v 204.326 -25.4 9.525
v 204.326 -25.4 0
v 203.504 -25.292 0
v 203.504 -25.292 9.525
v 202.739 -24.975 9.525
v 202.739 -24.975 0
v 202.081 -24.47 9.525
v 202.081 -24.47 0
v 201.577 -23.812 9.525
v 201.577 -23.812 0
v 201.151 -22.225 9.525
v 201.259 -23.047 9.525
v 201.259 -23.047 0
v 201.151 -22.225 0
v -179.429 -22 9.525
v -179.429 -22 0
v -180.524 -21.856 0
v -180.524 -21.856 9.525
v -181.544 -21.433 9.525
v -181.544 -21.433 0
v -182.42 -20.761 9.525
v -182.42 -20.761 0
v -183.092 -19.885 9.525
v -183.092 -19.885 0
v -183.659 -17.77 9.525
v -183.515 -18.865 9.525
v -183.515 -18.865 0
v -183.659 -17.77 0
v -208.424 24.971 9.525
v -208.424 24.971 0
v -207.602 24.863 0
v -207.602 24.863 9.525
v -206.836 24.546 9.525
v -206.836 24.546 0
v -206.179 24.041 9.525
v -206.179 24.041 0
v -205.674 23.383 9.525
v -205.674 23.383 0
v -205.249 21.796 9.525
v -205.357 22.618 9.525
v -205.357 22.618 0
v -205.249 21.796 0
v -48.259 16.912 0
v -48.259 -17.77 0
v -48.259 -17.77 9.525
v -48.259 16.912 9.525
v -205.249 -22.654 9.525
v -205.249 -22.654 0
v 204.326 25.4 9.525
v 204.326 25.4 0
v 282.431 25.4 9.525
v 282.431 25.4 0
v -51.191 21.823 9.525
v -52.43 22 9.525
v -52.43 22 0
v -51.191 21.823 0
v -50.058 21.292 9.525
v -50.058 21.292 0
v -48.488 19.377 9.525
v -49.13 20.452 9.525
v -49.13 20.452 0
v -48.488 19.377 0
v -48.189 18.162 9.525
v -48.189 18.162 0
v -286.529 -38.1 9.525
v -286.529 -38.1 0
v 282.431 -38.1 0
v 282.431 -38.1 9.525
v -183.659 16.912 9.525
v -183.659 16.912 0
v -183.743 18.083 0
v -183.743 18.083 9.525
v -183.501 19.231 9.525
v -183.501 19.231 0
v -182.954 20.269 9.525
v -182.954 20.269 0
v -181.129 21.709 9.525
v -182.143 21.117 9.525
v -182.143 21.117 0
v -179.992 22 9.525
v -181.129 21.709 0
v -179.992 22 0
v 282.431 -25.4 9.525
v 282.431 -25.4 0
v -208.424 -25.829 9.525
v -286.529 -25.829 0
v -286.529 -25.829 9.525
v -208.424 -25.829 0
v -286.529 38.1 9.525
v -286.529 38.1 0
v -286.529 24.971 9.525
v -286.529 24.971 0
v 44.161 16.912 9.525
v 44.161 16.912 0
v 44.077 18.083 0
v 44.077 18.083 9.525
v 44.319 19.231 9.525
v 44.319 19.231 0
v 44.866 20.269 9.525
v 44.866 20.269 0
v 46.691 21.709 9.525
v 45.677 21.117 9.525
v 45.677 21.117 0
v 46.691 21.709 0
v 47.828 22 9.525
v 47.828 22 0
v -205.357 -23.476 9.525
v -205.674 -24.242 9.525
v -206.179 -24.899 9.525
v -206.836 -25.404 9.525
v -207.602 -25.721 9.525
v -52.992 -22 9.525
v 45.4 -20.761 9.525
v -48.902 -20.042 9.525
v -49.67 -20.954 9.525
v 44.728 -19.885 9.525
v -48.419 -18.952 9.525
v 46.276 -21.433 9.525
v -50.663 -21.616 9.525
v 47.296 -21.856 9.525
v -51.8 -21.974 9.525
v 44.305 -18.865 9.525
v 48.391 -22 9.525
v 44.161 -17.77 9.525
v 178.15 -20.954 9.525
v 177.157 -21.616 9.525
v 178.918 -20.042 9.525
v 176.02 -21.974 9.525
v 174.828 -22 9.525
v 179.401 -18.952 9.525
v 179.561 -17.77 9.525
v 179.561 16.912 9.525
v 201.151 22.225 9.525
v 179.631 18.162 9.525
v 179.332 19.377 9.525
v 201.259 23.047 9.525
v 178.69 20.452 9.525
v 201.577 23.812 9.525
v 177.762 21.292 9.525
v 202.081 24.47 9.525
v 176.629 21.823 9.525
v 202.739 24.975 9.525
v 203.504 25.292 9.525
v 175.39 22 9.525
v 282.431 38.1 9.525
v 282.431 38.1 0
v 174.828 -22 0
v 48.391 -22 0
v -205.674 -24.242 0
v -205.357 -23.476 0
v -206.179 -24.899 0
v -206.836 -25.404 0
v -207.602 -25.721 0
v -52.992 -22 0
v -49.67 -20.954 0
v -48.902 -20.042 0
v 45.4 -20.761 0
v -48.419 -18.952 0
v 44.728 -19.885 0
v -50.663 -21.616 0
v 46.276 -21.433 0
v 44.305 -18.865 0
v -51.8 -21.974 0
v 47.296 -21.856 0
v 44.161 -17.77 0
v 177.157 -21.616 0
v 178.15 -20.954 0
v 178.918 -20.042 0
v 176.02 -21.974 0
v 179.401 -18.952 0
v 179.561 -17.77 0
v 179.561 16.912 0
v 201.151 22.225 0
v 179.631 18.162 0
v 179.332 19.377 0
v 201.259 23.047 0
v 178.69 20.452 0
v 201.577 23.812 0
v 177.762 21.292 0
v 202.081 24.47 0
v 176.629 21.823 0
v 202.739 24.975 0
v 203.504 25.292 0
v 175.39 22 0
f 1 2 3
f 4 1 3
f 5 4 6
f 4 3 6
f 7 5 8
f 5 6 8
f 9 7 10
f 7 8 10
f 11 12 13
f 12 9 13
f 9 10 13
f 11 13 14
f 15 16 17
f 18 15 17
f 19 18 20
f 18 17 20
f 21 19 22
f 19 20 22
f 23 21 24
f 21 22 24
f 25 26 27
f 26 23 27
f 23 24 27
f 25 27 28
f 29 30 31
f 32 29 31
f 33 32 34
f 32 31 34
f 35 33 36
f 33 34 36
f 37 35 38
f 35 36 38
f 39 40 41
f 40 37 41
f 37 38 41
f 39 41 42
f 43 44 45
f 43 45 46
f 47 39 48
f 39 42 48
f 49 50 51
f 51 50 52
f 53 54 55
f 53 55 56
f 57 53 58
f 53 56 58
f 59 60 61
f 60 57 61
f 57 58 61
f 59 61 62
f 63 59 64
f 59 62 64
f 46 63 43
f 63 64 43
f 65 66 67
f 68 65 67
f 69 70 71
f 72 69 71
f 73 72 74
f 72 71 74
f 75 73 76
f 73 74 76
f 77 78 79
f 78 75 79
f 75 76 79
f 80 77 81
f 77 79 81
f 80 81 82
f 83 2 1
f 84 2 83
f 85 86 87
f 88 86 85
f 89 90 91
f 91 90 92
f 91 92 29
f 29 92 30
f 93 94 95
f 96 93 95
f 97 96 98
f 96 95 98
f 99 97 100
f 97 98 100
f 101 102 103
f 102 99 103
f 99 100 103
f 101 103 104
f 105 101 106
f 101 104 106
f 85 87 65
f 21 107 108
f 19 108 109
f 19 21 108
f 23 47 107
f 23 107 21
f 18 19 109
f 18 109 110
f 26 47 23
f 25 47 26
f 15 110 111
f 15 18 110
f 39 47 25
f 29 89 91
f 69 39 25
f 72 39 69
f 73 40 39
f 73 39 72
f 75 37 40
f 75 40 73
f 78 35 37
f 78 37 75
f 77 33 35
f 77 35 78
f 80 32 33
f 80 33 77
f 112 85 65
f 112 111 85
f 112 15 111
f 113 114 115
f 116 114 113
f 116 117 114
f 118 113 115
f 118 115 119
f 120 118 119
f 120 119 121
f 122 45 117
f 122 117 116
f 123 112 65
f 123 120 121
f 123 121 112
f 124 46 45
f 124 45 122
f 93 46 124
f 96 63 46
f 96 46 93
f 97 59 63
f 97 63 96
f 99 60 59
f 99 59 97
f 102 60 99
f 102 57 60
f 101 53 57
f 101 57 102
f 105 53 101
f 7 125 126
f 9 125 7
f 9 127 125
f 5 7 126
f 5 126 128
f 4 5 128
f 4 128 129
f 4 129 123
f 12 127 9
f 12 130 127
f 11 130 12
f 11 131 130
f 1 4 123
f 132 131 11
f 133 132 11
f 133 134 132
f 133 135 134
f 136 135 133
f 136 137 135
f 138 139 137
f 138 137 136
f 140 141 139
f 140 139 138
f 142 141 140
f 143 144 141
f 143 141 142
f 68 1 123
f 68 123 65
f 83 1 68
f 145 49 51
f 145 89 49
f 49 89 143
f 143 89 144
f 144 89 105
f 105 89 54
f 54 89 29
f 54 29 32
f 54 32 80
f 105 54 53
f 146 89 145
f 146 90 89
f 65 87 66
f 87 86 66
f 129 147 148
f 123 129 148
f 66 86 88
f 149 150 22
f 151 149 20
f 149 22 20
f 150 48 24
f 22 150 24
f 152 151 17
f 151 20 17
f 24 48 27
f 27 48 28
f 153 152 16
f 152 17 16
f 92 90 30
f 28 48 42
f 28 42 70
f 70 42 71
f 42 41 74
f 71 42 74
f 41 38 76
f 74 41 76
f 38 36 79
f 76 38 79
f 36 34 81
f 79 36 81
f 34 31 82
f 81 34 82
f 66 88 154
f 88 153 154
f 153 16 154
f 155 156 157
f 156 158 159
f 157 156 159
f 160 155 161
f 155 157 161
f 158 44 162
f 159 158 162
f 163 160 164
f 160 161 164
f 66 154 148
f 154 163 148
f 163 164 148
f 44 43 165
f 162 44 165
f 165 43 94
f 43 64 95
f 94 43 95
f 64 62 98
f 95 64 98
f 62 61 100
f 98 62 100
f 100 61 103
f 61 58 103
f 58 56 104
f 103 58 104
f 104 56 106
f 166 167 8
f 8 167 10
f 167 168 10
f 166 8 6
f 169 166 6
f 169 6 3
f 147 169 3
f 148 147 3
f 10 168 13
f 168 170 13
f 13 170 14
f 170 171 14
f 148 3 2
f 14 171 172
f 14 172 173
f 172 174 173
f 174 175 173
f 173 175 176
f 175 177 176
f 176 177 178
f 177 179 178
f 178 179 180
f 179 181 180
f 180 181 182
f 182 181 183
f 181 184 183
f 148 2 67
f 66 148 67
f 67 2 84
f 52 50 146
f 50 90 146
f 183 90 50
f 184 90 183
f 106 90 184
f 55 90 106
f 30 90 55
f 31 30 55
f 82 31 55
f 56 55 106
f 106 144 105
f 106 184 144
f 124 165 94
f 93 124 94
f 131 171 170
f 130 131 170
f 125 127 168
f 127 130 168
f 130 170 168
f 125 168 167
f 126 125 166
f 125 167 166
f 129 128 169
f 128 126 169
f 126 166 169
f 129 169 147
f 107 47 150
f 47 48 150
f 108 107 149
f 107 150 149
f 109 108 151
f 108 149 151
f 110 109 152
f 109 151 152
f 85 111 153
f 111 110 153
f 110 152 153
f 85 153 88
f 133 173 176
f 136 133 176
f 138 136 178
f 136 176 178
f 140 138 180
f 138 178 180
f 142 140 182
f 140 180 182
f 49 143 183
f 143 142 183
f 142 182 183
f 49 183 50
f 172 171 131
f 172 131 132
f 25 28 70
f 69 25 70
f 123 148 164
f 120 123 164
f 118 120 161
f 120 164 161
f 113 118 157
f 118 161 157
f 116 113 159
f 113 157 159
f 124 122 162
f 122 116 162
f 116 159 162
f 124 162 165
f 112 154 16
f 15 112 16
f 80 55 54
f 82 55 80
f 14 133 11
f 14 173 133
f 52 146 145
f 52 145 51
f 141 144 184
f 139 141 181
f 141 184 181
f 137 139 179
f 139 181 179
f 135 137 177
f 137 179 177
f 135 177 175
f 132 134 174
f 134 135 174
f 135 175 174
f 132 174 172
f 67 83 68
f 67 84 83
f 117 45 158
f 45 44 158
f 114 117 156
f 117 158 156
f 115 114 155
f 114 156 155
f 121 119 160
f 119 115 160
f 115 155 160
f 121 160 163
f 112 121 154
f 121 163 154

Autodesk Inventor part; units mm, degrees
ref_plane "YZ Plane" through (0, 0, 0) normal (1, 0, 0) x (0, 1, 0)
ref_plane "XZ Plane" through (0, 0, 0) normal (0, 1, 0) x (-1, 0, 0)
ref_plane "XY Plane" through (0, 0, 0) normal (0, 0, 1) x (1, 0, 0)
sketch "Sketch1" plane through (0, 0, 0) normal (0, 0, 1) x (1, 0, 0)
  arc A0 (-179.9924, 22) -> (-183.6588, 16.912) centre (-179.5223, 17.7962) ccw
  arc A1 (-183.6588, -17.77) -> (-179.4288, -22) centre (-179.4288, -17.77) ccw
  arc A2 (-48.2588, 16.912) -> (-52.4305, 22) centre (-52.4009, 17.7701) ccw
  arc A3 (-52.9925, -22) -> (-48.2588, -17.77) centre (-52.4887, -17.8001) ccw
  line L0 (-52.4305, 22) -> (-179.9924, 22)
  line L1 (-52.9925, -22) -> (-179.4288, -22)
  line L2 (-48.2588, -17.77) -> (-48.2588, 16.912)
  line L3 (-183.6588, -17.77) -> (-183.6588, 16.912)
  line L4 (-286.5288, -25.829) -> (-208.4238, -25.829)
  line L5 (-286.5288, 24.971) -> (-208.4238, 24.971)
  line L6 (-205.2488, 21.796) -> (-205.2488, -22.654)
  arc A4 (-205.2488, 21.796) -> (-208.4238, 24.971) centre (-208.4238, 21.796) ccw
  arc A5 (-208.4238, -25.829) -> (-205.2488, -22.654) centre (-208.4238, -22.654) ccw
  arc A6 (44.1612, -17.77) -> (48.3912, -22) centre (48.3912, -17.77) ccw
  arc A7 (47.8276, 22) -> (44.1612, 16.912) centre (48.2978, 17.7962) ccw
  line L7 (44.1612, -17.77) -> (44.1612, 16.912)
  line L8 (204.3262, 25.4) -> (282.4312, 25.4)
  line L9 (204.3262, -25.4) -> (282.4312, -25.4)
  line L10 (174.8276, -22) -> (48.3912, -22)
  line L11 (175.3896, 22) -> (47.8276, 22)
  arc A8 (179.5612, 16.912) -> (175.3896, 22) centre (175.4192, 17.7701) ccw
  line L12 (179.5612, -17.77) -> (179.5612, 16.912)
  arc A9 (174.8276, -22) -> (179.5612, -17.77) centre (175.3313, -17.8001) ccw
  arc A10 (201.1512, -22.225) -> (204.3262, -25.4) centre (204.3262, -22.225) ccw
  arc A11 (204.3262, 25.4) -> (201.1512, 22.225) centre (204.3262, 22.225) ccw
  line L13 (201.1512, 22.225) -> (201.1512, -22.225)
  line L14 (-286.5288, 38.1) -> (282.4312, 38.1)
  line L15 (-286.5288, -38.1) -> (282.4312, -38.1)
  line L16 (282.4312, 38.1) -> (282.4312, 25.4)
  line L17 (282.4312, -25.4) -> (282.4312, -38.1)
  line L18 (-286.5288, 38.1) -> (-286.5288, 24.971)
  line L19 (-286.5288, -25.829) -> (-286.5288, -38.1)
  dimension "d0" = 135.4
  dimension "d1" = 44
  dimension "d8" = 78.105
  dimension "d13" = 50.8
  dimension "d14" = 44.45
  dimension "d15" = 21.59
  dimension "d18" = 135.4
  dimension "d19" = 44
  dimension "d20" = 78.105
  dimension "d21" = 50.8
  dimension "d26" = 568.96
  dimension "d33" = 21.59
extrude "Extrusion2" add sketch "Sketch1" along normal blind 9.525
properties part number "top" material "Aluminum 6061"
